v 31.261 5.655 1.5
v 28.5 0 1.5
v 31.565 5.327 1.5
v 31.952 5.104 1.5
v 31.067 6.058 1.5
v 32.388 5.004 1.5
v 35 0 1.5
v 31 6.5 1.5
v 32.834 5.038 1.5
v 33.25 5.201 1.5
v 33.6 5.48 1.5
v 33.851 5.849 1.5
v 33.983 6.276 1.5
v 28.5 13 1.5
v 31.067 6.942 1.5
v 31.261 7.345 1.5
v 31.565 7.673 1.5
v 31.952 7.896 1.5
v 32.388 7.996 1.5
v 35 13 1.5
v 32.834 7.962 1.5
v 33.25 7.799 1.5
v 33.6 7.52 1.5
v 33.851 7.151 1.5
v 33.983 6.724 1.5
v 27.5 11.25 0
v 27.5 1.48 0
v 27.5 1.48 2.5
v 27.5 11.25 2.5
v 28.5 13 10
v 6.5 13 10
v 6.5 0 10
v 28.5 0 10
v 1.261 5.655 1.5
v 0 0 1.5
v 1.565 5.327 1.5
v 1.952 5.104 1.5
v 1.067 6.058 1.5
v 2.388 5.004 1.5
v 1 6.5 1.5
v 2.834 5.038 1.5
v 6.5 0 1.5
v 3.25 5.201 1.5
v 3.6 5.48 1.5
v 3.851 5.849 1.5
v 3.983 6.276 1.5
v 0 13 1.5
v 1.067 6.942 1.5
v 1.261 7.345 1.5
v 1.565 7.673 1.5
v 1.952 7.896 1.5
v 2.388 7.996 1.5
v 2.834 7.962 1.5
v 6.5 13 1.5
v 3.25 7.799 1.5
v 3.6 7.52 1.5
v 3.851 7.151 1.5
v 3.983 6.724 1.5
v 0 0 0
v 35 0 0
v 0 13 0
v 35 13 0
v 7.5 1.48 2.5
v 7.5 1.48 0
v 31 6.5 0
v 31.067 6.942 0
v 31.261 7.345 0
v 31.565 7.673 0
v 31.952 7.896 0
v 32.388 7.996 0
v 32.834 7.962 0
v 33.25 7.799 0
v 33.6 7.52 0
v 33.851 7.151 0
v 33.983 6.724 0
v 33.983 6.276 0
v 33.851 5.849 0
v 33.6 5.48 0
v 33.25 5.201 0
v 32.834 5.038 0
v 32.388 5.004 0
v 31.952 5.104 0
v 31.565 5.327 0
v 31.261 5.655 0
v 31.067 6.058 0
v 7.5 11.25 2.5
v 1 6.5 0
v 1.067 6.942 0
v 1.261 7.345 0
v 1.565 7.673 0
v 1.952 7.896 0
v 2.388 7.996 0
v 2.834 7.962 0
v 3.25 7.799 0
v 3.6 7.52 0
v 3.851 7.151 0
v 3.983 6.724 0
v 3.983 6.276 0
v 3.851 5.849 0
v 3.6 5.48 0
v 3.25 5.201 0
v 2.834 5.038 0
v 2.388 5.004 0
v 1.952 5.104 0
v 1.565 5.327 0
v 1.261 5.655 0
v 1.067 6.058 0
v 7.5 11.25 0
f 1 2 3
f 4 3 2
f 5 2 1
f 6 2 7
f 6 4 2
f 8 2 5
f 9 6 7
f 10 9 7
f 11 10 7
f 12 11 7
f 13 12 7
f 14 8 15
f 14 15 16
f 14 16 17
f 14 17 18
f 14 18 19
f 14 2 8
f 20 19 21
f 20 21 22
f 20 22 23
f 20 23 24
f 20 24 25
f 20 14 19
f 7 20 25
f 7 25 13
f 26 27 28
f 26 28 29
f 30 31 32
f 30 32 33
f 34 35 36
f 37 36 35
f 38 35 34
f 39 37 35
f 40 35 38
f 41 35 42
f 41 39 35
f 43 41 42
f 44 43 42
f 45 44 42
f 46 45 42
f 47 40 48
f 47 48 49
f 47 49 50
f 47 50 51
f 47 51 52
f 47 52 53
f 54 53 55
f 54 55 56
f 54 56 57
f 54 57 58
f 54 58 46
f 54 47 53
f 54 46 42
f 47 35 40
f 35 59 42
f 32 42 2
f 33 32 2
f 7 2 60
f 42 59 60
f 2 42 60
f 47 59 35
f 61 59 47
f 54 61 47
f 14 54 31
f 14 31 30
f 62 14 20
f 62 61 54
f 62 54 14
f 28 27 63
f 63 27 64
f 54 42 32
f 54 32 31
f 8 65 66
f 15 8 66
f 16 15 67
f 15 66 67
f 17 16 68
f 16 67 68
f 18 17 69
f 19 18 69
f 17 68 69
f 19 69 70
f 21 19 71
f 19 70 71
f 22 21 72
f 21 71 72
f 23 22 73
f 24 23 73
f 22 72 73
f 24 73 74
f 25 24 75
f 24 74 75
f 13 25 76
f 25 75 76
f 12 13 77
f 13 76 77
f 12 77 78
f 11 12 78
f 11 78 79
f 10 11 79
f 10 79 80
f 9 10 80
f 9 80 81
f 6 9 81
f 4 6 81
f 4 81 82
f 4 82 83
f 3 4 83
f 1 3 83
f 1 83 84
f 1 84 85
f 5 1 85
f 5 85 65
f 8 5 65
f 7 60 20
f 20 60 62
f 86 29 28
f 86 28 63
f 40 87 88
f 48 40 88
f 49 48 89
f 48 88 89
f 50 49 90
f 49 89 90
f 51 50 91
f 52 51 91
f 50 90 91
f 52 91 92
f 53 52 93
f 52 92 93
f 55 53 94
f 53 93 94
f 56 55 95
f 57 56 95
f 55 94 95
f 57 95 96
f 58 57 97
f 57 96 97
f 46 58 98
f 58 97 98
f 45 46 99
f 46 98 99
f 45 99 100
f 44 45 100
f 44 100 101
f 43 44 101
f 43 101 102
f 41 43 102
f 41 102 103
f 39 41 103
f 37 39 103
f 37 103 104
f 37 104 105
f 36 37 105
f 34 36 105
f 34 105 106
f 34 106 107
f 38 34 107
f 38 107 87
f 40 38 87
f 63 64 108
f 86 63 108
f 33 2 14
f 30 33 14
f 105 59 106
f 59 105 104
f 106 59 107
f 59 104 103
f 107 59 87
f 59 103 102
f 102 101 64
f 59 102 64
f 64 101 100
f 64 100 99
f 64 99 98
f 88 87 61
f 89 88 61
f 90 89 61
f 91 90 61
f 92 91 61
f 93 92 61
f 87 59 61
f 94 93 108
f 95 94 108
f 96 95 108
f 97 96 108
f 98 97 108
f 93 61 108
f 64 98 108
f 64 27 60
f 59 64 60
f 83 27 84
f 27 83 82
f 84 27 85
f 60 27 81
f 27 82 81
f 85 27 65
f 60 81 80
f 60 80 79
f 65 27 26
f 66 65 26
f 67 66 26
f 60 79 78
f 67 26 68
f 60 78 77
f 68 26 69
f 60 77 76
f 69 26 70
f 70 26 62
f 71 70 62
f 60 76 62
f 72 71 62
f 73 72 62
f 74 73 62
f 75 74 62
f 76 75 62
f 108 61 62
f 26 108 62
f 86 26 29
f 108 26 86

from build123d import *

# Parameters (mm, degrees)
ESBO_O1_W                = 35
ESBO_O1_H                = 13
RESSALTO_EXTRUS_O1_DEPTH = 1.5
ESBO_O2_W                = 22
ESBO_O2_H                = 13
RESSALTO_EXTRUS_O2_DEPTH = 8.5
ESBO_O3_W                = 20
ESBO_O3_H                = 9.770333273
CORTE_EXTRUS_O1_DEPTH    = 2.5
ESBO_O4_R                = 1.5
CORTE_EXTRUS_O2_DEPTH    = 2.5


with BuildPart() as part:
    # Esboço1 → Ressalto-extrusão1 (new body)
    with BuildSketch(Plane.XY):
        with Locations((17.5, 6.5)):
            Rectangle(ESBO_O1_W, ESBO_O1_H)
    extrude(amount=RESSALTO_EXTRUS_O1_DEPTH)

    # Esboço2 → Ressalto-extrusão2 (add)
    with BuildSketch(Plane.XY.offset(1.5)):
        with Locations((17.5, 6.5)):
            Rectangle(ESBO_O2_W, ESBO_O2_H)
    extrude(amount=RESSALTO_EXTRUS_O2_DEPTH)

    # Esboço3 → Corte-extrusão1 (cut)
    with BuildSketch(Plane(origin=(0, 0, 0), x_dir=(-1, 0, 0), z_dir=(0, 0, -1))):
        with Locations((-17.5, 6.364833363)):
            Rectangle(ESBO_O3_W, ESBO_O3_H)
    extrude(amount=-CORTE_EXTRUS_O1_DEPTH, mode=Mode.SUBTRACT)

    # Esboço4 → Corte-extrusão2 (cut)
    with BuildSketch(Plane(origin=(0, 0, 0), x_dir=(-1, 0, 0), z_dir=(0, 0, -1))):
        with Locations((-32.5, 6.5)):
            Circle(ESBO_O4_R)
        with Locations((-2.5, 6.5)):
            Circle(ESBO_O4_R)
    extrude(amount=-CORTE_EXTRUS_O2_DEPTH, mode=Mode.SUBTRACT)


solid = part.part
